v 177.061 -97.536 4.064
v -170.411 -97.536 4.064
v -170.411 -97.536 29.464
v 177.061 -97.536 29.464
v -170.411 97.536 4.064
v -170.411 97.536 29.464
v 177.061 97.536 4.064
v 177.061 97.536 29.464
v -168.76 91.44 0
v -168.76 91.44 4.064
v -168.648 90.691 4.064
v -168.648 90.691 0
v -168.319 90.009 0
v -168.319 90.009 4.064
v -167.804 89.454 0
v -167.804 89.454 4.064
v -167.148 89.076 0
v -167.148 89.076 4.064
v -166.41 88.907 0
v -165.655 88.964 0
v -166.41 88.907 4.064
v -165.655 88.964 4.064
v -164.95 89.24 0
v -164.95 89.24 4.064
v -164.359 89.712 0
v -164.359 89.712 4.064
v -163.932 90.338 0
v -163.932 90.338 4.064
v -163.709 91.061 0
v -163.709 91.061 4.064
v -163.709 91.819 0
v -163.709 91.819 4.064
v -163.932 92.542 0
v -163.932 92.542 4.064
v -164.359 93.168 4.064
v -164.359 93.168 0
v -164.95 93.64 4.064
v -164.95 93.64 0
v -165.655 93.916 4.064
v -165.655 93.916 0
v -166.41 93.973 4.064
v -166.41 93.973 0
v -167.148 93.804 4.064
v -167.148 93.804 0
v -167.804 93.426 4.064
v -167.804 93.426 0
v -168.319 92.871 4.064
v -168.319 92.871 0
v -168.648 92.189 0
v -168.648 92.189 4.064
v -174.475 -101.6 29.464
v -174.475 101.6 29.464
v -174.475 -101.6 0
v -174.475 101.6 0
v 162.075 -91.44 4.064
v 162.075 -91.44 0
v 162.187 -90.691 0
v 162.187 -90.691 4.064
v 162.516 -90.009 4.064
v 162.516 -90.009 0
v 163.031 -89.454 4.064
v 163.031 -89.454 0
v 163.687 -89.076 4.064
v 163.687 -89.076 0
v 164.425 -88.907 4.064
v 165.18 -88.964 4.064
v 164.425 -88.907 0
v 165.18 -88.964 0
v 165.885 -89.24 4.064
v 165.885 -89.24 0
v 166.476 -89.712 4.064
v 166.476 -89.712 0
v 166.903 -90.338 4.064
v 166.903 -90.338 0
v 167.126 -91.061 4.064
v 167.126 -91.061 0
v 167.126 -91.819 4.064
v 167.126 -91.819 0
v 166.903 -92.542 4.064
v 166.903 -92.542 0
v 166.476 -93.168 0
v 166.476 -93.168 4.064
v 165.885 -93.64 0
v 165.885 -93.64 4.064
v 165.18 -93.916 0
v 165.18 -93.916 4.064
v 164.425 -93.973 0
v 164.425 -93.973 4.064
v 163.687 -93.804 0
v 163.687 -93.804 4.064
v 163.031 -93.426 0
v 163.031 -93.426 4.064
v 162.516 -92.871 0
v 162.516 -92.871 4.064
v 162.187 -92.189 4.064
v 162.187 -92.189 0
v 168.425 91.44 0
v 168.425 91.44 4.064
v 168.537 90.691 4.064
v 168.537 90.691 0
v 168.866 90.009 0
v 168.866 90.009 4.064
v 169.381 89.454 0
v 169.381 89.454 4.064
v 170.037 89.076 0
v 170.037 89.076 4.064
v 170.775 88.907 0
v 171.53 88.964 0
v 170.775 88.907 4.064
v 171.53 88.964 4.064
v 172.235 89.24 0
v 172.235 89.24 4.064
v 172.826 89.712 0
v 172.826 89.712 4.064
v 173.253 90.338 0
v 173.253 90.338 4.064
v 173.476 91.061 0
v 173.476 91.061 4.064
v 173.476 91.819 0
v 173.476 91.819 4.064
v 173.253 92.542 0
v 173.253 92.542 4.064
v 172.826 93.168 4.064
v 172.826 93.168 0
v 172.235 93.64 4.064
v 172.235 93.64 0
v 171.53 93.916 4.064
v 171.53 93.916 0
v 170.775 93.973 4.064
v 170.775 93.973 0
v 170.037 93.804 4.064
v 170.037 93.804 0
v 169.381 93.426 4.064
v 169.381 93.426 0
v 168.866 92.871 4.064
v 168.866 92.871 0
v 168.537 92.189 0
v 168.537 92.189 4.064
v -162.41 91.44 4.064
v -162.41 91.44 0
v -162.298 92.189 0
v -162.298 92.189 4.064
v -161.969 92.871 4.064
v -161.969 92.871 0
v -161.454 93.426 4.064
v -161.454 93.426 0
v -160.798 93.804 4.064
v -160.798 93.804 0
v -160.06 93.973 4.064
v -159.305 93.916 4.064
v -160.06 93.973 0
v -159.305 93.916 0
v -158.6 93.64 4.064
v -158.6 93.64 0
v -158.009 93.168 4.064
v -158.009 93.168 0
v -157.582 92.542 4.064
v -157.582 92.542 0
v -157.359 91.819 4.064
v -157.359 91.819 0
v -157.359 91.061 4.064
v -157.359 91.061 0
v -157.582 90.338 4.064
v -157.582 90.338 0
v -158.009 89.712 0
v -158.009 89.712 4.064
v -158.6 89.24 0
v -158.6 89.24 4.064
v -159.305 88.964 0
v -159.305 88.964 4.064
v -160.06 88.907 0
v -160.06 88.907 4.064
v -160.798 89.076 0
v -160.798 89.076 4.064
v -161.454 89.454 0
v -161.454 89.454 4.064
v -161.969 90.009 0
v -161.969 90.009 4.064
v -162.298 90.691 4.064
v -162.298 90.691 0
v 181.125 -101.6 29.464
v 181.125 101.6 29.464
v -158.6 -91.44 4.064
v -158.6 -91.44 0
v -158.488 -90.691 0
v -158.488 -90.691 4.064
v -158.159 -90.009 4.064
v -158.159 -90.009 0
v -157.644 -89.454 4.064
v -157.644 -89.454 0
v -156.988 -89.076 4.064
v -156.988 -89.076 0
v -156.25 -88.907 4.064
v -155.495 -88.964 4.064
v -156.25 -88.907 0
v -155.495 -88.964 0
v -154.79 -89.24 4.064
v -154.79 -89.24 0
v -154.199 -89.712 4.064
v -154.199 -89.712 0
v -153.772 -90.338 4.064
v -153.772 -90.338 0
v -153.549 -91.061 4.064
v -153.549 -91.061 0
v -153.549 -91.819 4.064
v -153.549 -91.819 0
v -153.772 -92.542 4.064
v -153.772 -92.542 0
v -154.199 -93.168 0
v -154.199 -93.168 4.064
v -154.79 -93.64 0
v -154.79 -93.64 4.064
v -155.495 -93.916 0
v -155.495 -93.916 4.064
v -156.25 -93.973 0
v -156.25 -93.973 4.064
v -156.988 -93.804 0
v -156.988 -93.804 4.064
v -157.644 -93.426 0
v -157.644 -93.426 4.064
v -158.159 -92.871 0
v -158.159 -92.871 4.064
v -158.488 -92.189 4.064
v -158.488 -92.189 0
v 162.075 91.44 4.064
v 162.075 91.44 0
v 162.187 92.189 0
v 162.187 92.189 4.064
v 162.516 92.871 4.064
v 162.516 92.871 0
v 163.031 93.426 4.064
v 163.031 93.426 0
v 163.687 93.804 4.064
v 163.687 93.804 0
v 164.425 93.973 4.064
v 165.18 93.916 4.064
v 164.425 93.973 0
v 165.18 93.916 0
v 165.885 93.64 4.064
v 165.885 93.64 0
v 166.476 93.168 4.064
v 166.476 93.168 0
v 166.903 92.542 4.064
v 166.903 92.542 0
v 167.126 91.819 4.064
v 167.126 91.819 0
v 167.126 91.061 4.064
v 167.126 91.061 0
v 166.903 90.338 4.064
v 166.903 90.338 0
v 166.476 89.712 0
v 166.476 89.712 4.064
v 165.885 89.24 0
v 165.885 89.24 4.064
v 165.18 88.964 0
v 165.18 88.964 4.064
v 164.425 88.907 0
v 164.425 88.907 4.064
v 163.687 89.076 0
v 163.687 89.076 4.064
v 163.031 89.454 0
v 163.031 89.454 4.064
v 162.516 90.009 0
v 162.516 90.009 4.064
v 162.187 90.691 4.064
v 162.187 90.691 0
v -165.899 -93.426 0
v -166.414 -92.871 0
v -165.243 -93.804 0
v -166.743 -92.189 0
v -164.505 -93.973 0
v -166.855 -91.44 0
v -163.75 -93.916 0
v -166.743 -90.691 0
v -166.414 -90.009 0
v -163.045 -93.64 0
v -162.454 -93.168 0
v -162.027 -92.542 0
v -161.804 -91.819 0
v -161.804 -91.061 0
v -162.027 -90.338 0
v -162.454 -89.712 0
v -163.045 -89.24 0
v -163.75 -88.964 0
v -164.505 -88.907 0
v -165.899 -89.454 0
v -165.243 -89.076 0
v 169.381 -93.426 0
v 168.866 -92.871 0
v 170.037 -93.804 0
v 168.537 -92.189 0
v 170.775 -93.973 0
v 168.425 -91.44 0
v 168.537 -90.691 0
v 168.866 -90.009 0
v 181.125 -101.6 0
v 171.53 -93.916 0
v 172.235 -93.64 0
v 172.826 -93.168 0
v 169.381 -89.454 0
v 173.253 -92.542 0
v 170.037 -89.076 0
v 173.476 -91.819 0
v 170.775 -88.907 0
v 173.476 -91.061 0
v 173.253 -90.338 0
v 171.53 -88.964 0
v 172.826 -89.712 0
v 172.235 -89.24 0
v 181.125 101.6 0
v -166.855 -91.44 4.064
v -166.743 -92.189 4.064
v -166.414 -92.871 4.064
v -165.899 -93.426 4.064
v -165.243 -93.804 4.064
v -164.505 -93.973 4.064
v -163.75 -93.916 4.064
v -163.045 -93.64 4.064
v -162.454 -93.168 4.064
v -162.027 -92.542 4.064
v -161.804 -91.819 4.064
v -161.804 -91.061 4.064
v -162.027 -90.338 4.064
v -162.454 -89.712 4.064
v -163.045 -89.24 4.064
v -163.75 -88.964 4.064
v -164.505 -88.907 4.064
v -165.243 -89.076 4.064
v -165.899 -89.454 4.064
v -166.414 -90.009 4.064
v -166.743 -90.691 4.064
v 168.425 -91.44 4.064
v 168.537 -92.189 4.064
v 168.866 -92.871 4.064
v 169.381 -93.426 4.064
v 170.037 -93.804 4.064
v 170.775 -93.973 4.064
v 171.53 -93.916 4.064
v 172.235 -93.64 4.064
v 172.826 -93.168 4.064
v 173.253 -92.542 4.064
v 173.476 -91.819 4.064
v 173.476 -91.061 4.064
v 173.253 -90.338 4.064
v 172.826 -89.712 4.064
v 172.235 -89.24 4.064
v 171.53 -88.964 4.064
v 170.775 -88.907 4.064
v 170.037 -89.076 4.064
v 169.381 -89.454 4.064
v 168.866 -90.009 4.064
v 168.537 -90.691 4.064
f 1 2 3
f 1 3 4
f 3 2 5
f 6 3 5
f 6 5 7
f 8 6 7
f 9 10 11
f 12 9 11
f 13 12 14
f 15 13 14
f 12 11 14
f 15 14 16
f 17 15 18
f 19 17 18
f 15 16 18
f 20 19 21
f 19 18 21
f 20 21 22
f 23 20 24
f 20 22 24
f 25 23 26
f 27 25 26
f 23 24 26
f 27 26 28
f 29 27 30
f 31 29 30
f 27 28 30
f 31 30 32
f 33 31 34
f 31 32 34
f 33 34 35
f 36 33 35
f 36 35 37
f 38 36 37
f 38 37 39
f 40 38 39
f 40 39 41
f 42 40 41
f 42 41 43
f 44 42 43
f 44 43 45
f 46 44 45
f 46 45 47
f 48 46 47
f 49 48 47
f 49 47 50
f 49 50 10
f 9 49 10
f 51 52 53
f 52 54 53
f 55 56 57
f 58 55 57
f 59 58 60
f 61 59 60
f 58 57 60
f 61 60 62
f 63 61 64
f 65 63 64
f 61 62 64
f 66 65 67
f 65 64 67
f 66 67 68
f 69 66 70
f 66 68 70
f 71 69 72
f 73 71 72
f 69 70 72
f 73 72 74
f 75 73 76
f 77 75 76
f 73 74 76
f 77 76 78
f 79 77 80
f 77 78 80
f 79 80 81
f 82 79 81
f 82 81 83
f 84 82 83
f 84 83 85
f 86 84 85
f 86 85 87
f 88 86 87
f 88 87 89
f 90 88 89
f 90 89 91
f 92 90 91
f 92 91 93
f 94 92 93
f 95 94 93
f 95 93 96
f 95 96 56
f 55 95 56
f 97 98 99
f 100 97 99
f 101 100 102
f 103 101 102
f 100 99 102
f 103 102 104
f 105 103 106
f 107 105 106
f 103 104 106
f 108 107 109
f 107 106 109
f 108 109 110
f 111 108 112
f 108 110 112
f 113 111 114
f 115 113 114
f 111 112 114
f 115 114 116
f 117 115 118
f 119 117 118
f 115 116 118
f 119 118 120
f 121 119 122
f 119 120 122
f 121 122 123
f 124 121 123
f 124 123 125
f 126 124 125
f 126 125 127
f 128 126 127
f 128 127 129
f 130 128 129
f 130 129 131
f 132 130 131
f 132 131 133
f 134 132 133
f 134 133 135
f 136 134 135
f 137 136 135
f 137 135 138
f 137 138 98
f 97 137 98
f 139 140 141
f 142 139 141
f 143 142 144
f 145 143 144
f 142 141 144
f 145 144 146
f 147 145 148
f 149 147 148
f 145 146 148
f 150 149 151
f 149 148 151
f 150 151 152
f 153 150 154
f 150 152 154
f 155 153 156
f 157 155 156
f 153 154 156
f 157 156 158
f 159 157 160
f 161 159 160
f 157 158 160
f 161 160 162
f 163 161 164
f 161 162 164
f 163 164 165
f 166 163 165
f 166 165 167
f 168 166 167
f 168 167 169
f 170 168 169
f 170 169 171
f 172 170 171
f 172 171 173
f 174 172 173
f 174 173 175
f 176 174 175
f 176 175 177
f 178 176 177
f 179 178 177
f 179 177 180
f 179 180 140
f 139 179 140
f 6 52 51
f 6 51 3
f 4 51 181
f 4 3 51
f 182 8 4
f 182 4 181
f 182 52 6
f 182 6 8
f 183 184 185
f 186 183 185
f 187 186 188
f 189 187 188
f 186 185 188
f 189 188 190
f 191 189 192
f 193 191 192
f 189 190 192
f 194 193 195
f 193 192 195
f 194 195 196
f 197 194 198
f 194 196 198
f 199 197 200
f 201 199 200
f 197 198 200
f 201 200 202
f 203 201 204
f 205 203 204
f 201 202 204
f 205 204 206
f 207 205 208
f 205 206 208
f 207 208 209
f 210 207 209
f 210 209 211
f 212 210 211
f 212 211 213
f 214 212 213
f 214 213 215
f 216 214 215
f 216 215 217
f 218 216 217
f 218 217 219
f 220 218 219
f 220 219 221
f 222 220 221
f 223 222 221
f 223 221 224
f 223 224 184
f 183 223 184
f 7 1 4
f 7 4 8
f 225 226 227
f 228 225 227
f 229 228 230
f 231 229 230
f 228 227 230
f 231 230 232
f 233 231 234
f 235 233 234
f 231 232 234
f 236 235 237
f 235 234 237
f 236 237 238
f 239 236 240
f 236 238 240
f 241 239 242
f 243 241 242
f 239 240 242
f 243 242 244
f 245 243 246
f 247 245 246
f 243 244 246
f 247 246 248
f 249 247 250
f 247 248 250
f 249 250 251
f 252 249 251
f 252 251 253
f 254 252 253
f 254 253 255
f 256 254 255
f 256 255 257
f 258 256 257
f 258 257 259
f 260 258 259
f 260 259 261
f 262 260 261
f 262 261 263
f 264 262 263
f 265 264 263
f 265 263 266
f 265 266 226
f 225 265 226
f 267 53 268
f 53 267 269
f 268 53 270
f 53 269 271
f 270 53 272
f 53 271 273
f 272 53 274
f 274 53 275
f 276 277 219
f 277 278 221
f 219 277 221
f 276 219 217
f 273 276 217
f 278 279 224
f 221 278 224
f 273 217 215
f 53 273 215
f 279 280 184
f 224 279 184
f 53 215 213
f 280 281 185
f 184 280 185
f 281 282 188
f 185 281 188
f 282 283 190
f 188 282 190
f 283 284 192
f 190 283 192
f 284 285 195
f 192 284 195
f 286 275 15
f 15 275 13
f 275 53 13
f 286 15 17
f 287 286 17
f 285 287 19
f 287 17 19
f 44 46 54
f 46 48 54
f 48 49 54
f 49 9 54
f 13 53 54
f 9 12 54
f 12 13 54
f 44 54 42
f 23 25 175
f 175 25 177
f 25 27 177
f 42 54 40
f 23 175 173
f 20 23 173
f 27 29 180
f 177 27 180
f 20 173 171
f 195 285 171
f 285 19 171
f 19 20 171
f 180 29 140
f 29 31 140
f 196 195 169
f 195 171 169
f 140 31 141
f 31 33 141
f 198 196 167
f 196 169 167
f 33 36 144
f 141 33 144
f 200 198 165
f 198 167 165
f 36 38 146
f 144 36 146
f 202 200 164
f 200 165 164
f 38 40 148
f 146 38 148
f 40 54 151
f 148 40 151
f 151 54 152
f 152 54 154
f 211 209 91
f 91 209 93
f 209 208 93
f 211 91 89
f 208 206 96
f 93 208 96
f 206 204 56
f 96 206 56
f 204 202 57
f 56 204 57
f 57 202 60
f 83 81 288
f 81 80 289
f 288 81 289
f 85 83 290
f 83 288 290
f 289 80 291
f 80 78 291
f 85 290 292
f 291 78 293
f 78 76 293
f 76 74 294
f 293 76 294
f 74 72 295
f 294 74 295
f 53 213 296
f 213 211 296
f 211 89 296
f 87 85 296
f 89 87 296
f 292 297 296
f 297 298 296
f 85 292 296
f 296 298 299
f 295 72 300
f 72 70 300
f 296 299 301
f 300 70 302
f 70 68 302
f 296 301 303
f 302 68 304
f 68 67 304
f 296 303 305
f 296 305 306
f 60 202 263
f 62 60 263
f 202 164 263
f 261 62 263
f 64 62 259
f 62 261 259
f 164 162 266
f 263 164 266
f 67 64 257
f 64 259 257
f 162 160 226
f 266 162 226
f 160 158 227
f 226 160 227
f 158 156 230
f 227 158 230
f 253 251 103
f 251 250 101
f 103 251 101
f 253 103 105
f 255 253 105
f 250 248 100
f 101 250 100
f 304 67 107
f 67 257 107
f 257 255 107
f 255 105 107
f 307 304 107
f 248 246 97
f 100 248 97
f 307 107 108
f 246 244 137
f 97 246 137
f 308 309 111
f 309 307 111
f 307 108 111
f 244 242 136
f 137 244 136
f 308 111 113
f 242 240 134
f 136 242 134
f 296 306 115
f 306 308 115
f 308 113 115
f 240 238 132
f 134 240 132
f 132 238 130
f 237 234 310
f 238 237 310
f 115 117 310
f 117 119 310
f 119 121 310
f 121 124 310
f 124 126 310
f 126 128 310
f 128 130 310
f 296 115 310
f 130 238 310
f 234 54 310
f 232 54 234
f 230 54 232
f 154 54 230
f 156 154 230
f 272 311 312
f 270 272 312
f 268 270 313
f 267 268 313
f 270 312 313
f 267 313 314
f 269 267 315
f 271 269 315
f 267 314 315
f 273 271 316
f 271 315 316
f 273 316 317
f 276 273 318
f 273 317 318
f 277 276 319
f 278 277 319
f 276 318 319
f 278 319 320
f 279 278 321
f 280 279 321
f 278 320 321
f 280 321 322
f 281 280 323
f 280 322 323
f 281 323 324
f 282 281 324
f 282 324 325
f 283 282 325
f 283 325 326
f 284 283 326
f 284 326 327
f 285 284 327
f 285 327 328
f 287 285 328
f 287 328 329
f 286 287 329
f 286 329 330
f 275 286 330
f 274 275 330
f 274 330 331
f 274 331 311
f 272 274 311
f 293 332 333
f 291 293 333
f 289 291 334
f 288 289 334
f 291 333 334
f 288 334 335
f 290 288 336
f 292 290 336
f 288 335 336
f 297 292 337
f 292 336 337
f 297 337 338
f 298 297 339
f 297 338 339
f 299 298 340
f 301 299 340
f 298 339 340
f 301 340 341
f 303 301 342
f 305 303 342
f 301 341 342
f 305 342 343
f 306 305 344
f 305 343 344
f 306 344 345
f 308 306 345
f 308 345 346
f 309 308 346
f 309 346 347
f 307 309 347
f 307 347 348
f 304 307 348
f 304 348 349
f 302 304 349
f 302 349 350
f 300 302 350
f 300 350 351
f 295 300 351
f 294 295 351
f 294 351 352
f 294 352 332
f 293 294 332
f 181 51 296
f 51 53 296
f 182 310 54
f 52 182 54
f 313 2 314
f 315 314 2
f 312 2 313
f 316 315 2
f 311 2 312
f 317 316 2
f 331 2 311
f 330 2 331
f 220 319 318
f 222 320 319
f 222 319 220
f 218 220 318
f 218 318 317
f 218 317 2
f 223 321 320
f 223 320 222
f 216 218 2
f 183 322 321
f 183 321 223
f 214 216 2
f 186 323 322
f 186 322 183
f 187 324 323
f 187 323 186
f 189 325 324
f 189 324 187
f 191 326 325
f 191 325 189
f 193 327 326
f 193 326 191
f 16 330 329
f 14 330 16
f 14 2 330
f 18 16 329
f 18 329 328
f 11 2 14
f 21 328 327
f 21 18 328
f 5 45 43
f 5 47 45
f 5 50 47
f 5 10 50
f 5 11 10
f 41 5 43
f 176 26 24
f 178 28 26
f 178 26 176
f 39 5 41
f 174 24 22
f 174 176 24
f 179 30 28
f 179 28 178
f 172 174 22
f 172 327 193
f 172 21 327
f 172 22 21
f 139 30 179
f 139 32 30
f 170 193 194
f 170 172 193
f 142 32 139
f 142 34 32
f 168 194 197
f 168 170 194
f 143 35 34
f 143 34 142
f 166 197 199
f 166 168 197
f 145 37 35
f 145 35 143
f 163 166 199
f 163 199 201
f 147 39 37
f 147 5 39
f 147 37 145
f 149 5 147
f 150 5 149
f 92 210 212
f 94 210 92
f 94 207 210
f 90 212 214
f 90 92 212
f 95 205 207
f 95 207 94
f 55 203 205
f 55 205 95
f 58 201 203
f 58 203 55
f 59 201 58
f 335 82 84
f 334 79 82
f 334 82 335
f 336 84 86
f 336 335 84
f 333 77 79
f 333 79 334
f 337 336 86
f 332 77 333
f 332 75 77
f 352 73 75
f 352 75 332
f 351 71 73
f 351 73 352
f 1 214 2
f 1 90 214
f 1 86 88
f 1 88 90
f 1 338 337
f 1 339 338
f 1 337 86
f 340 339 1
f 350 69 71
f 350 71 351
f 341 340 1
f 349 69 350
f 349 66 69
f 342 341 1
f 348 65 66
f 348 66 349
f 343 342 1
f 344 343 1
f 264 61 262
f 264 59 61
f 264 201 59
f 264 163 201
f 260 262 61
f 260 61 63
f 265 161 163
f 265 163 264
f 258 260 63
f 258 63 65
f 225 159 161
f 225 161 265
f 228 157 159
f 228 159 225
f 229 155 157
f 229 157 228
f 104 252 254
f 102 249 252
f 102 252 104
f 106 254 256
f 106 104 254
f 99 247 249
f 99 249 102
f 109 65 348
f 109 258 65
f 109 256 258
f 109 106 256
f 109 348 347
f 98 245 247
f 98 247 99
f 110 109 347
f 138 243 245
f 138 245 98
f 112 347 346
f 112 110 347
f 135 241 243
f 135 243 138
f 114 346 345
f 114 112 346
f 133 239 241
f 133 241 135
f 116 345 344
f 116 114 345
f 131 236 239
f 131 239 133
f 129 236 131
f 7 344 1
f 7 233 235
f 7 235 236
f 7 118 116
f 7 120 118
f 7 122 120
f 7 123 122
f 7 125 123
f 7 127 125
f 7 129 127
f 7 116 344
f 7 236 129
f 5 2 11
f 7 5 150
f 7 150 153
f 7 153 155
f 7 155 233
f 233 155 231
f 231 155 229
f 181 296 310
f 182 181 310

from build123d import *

# Parameters (mm, degrees)
F1_DEPTH = 4.064
F3_D     = 5.08
F4_W     = 347.472
F4_H     = 195.072
F5_DEPTH = 25.4
F7_D     = 5.08


with BuildPart() as f1:
    # F0 (on Top) → F1 (new body)
    with BuildSketch(Plane.XY):
        Polygon((181.124512, 101.6), (-174.475488, 101.6), (-174.475488, 88.9), (-174.475488, -101.6), (181.124512, -101.6), (181.124512, 88.9), align=None)
    extrude(amount=F1_DEPTH)

    # F3 (through all)
    with Locations(Plane(origin=(0, 0, 0), x_dir=(1, 0, 0), z_dir=(0, 0, -1))):
        with Locations((-166.220488, -91.44), (170.964512, -91.44), (-164.315488, 91.44), (170.964512, 91.44)):
            Hole(F3_D / 2)

    # F4 (on face) → F5 (join)
    with BuildSketch(Plane.XY.offset(4.064)):
        Polygon((181.124512, 101.6), (177.060512, 101.6), (-174.475488, 101.6), (-174.475488, -101.6), (181.124512, -101.6), align=None)
        with Locations((3.324512, 0)):
            Rectangle(F4_W, F4_H, mode=Mode.SUBTRACT)
    extrude(amount=F5_DEPTH)

    # F7 (through all)
    with Locations(Plane.XY.offset(4.064)):
        with Locations((-156.060488, -91.44), (164.614512, -91.44), (164.614512, 91.44), (-159.870488, 91.44)):
            Hole(F7_D / 2)


solid = f1.part
